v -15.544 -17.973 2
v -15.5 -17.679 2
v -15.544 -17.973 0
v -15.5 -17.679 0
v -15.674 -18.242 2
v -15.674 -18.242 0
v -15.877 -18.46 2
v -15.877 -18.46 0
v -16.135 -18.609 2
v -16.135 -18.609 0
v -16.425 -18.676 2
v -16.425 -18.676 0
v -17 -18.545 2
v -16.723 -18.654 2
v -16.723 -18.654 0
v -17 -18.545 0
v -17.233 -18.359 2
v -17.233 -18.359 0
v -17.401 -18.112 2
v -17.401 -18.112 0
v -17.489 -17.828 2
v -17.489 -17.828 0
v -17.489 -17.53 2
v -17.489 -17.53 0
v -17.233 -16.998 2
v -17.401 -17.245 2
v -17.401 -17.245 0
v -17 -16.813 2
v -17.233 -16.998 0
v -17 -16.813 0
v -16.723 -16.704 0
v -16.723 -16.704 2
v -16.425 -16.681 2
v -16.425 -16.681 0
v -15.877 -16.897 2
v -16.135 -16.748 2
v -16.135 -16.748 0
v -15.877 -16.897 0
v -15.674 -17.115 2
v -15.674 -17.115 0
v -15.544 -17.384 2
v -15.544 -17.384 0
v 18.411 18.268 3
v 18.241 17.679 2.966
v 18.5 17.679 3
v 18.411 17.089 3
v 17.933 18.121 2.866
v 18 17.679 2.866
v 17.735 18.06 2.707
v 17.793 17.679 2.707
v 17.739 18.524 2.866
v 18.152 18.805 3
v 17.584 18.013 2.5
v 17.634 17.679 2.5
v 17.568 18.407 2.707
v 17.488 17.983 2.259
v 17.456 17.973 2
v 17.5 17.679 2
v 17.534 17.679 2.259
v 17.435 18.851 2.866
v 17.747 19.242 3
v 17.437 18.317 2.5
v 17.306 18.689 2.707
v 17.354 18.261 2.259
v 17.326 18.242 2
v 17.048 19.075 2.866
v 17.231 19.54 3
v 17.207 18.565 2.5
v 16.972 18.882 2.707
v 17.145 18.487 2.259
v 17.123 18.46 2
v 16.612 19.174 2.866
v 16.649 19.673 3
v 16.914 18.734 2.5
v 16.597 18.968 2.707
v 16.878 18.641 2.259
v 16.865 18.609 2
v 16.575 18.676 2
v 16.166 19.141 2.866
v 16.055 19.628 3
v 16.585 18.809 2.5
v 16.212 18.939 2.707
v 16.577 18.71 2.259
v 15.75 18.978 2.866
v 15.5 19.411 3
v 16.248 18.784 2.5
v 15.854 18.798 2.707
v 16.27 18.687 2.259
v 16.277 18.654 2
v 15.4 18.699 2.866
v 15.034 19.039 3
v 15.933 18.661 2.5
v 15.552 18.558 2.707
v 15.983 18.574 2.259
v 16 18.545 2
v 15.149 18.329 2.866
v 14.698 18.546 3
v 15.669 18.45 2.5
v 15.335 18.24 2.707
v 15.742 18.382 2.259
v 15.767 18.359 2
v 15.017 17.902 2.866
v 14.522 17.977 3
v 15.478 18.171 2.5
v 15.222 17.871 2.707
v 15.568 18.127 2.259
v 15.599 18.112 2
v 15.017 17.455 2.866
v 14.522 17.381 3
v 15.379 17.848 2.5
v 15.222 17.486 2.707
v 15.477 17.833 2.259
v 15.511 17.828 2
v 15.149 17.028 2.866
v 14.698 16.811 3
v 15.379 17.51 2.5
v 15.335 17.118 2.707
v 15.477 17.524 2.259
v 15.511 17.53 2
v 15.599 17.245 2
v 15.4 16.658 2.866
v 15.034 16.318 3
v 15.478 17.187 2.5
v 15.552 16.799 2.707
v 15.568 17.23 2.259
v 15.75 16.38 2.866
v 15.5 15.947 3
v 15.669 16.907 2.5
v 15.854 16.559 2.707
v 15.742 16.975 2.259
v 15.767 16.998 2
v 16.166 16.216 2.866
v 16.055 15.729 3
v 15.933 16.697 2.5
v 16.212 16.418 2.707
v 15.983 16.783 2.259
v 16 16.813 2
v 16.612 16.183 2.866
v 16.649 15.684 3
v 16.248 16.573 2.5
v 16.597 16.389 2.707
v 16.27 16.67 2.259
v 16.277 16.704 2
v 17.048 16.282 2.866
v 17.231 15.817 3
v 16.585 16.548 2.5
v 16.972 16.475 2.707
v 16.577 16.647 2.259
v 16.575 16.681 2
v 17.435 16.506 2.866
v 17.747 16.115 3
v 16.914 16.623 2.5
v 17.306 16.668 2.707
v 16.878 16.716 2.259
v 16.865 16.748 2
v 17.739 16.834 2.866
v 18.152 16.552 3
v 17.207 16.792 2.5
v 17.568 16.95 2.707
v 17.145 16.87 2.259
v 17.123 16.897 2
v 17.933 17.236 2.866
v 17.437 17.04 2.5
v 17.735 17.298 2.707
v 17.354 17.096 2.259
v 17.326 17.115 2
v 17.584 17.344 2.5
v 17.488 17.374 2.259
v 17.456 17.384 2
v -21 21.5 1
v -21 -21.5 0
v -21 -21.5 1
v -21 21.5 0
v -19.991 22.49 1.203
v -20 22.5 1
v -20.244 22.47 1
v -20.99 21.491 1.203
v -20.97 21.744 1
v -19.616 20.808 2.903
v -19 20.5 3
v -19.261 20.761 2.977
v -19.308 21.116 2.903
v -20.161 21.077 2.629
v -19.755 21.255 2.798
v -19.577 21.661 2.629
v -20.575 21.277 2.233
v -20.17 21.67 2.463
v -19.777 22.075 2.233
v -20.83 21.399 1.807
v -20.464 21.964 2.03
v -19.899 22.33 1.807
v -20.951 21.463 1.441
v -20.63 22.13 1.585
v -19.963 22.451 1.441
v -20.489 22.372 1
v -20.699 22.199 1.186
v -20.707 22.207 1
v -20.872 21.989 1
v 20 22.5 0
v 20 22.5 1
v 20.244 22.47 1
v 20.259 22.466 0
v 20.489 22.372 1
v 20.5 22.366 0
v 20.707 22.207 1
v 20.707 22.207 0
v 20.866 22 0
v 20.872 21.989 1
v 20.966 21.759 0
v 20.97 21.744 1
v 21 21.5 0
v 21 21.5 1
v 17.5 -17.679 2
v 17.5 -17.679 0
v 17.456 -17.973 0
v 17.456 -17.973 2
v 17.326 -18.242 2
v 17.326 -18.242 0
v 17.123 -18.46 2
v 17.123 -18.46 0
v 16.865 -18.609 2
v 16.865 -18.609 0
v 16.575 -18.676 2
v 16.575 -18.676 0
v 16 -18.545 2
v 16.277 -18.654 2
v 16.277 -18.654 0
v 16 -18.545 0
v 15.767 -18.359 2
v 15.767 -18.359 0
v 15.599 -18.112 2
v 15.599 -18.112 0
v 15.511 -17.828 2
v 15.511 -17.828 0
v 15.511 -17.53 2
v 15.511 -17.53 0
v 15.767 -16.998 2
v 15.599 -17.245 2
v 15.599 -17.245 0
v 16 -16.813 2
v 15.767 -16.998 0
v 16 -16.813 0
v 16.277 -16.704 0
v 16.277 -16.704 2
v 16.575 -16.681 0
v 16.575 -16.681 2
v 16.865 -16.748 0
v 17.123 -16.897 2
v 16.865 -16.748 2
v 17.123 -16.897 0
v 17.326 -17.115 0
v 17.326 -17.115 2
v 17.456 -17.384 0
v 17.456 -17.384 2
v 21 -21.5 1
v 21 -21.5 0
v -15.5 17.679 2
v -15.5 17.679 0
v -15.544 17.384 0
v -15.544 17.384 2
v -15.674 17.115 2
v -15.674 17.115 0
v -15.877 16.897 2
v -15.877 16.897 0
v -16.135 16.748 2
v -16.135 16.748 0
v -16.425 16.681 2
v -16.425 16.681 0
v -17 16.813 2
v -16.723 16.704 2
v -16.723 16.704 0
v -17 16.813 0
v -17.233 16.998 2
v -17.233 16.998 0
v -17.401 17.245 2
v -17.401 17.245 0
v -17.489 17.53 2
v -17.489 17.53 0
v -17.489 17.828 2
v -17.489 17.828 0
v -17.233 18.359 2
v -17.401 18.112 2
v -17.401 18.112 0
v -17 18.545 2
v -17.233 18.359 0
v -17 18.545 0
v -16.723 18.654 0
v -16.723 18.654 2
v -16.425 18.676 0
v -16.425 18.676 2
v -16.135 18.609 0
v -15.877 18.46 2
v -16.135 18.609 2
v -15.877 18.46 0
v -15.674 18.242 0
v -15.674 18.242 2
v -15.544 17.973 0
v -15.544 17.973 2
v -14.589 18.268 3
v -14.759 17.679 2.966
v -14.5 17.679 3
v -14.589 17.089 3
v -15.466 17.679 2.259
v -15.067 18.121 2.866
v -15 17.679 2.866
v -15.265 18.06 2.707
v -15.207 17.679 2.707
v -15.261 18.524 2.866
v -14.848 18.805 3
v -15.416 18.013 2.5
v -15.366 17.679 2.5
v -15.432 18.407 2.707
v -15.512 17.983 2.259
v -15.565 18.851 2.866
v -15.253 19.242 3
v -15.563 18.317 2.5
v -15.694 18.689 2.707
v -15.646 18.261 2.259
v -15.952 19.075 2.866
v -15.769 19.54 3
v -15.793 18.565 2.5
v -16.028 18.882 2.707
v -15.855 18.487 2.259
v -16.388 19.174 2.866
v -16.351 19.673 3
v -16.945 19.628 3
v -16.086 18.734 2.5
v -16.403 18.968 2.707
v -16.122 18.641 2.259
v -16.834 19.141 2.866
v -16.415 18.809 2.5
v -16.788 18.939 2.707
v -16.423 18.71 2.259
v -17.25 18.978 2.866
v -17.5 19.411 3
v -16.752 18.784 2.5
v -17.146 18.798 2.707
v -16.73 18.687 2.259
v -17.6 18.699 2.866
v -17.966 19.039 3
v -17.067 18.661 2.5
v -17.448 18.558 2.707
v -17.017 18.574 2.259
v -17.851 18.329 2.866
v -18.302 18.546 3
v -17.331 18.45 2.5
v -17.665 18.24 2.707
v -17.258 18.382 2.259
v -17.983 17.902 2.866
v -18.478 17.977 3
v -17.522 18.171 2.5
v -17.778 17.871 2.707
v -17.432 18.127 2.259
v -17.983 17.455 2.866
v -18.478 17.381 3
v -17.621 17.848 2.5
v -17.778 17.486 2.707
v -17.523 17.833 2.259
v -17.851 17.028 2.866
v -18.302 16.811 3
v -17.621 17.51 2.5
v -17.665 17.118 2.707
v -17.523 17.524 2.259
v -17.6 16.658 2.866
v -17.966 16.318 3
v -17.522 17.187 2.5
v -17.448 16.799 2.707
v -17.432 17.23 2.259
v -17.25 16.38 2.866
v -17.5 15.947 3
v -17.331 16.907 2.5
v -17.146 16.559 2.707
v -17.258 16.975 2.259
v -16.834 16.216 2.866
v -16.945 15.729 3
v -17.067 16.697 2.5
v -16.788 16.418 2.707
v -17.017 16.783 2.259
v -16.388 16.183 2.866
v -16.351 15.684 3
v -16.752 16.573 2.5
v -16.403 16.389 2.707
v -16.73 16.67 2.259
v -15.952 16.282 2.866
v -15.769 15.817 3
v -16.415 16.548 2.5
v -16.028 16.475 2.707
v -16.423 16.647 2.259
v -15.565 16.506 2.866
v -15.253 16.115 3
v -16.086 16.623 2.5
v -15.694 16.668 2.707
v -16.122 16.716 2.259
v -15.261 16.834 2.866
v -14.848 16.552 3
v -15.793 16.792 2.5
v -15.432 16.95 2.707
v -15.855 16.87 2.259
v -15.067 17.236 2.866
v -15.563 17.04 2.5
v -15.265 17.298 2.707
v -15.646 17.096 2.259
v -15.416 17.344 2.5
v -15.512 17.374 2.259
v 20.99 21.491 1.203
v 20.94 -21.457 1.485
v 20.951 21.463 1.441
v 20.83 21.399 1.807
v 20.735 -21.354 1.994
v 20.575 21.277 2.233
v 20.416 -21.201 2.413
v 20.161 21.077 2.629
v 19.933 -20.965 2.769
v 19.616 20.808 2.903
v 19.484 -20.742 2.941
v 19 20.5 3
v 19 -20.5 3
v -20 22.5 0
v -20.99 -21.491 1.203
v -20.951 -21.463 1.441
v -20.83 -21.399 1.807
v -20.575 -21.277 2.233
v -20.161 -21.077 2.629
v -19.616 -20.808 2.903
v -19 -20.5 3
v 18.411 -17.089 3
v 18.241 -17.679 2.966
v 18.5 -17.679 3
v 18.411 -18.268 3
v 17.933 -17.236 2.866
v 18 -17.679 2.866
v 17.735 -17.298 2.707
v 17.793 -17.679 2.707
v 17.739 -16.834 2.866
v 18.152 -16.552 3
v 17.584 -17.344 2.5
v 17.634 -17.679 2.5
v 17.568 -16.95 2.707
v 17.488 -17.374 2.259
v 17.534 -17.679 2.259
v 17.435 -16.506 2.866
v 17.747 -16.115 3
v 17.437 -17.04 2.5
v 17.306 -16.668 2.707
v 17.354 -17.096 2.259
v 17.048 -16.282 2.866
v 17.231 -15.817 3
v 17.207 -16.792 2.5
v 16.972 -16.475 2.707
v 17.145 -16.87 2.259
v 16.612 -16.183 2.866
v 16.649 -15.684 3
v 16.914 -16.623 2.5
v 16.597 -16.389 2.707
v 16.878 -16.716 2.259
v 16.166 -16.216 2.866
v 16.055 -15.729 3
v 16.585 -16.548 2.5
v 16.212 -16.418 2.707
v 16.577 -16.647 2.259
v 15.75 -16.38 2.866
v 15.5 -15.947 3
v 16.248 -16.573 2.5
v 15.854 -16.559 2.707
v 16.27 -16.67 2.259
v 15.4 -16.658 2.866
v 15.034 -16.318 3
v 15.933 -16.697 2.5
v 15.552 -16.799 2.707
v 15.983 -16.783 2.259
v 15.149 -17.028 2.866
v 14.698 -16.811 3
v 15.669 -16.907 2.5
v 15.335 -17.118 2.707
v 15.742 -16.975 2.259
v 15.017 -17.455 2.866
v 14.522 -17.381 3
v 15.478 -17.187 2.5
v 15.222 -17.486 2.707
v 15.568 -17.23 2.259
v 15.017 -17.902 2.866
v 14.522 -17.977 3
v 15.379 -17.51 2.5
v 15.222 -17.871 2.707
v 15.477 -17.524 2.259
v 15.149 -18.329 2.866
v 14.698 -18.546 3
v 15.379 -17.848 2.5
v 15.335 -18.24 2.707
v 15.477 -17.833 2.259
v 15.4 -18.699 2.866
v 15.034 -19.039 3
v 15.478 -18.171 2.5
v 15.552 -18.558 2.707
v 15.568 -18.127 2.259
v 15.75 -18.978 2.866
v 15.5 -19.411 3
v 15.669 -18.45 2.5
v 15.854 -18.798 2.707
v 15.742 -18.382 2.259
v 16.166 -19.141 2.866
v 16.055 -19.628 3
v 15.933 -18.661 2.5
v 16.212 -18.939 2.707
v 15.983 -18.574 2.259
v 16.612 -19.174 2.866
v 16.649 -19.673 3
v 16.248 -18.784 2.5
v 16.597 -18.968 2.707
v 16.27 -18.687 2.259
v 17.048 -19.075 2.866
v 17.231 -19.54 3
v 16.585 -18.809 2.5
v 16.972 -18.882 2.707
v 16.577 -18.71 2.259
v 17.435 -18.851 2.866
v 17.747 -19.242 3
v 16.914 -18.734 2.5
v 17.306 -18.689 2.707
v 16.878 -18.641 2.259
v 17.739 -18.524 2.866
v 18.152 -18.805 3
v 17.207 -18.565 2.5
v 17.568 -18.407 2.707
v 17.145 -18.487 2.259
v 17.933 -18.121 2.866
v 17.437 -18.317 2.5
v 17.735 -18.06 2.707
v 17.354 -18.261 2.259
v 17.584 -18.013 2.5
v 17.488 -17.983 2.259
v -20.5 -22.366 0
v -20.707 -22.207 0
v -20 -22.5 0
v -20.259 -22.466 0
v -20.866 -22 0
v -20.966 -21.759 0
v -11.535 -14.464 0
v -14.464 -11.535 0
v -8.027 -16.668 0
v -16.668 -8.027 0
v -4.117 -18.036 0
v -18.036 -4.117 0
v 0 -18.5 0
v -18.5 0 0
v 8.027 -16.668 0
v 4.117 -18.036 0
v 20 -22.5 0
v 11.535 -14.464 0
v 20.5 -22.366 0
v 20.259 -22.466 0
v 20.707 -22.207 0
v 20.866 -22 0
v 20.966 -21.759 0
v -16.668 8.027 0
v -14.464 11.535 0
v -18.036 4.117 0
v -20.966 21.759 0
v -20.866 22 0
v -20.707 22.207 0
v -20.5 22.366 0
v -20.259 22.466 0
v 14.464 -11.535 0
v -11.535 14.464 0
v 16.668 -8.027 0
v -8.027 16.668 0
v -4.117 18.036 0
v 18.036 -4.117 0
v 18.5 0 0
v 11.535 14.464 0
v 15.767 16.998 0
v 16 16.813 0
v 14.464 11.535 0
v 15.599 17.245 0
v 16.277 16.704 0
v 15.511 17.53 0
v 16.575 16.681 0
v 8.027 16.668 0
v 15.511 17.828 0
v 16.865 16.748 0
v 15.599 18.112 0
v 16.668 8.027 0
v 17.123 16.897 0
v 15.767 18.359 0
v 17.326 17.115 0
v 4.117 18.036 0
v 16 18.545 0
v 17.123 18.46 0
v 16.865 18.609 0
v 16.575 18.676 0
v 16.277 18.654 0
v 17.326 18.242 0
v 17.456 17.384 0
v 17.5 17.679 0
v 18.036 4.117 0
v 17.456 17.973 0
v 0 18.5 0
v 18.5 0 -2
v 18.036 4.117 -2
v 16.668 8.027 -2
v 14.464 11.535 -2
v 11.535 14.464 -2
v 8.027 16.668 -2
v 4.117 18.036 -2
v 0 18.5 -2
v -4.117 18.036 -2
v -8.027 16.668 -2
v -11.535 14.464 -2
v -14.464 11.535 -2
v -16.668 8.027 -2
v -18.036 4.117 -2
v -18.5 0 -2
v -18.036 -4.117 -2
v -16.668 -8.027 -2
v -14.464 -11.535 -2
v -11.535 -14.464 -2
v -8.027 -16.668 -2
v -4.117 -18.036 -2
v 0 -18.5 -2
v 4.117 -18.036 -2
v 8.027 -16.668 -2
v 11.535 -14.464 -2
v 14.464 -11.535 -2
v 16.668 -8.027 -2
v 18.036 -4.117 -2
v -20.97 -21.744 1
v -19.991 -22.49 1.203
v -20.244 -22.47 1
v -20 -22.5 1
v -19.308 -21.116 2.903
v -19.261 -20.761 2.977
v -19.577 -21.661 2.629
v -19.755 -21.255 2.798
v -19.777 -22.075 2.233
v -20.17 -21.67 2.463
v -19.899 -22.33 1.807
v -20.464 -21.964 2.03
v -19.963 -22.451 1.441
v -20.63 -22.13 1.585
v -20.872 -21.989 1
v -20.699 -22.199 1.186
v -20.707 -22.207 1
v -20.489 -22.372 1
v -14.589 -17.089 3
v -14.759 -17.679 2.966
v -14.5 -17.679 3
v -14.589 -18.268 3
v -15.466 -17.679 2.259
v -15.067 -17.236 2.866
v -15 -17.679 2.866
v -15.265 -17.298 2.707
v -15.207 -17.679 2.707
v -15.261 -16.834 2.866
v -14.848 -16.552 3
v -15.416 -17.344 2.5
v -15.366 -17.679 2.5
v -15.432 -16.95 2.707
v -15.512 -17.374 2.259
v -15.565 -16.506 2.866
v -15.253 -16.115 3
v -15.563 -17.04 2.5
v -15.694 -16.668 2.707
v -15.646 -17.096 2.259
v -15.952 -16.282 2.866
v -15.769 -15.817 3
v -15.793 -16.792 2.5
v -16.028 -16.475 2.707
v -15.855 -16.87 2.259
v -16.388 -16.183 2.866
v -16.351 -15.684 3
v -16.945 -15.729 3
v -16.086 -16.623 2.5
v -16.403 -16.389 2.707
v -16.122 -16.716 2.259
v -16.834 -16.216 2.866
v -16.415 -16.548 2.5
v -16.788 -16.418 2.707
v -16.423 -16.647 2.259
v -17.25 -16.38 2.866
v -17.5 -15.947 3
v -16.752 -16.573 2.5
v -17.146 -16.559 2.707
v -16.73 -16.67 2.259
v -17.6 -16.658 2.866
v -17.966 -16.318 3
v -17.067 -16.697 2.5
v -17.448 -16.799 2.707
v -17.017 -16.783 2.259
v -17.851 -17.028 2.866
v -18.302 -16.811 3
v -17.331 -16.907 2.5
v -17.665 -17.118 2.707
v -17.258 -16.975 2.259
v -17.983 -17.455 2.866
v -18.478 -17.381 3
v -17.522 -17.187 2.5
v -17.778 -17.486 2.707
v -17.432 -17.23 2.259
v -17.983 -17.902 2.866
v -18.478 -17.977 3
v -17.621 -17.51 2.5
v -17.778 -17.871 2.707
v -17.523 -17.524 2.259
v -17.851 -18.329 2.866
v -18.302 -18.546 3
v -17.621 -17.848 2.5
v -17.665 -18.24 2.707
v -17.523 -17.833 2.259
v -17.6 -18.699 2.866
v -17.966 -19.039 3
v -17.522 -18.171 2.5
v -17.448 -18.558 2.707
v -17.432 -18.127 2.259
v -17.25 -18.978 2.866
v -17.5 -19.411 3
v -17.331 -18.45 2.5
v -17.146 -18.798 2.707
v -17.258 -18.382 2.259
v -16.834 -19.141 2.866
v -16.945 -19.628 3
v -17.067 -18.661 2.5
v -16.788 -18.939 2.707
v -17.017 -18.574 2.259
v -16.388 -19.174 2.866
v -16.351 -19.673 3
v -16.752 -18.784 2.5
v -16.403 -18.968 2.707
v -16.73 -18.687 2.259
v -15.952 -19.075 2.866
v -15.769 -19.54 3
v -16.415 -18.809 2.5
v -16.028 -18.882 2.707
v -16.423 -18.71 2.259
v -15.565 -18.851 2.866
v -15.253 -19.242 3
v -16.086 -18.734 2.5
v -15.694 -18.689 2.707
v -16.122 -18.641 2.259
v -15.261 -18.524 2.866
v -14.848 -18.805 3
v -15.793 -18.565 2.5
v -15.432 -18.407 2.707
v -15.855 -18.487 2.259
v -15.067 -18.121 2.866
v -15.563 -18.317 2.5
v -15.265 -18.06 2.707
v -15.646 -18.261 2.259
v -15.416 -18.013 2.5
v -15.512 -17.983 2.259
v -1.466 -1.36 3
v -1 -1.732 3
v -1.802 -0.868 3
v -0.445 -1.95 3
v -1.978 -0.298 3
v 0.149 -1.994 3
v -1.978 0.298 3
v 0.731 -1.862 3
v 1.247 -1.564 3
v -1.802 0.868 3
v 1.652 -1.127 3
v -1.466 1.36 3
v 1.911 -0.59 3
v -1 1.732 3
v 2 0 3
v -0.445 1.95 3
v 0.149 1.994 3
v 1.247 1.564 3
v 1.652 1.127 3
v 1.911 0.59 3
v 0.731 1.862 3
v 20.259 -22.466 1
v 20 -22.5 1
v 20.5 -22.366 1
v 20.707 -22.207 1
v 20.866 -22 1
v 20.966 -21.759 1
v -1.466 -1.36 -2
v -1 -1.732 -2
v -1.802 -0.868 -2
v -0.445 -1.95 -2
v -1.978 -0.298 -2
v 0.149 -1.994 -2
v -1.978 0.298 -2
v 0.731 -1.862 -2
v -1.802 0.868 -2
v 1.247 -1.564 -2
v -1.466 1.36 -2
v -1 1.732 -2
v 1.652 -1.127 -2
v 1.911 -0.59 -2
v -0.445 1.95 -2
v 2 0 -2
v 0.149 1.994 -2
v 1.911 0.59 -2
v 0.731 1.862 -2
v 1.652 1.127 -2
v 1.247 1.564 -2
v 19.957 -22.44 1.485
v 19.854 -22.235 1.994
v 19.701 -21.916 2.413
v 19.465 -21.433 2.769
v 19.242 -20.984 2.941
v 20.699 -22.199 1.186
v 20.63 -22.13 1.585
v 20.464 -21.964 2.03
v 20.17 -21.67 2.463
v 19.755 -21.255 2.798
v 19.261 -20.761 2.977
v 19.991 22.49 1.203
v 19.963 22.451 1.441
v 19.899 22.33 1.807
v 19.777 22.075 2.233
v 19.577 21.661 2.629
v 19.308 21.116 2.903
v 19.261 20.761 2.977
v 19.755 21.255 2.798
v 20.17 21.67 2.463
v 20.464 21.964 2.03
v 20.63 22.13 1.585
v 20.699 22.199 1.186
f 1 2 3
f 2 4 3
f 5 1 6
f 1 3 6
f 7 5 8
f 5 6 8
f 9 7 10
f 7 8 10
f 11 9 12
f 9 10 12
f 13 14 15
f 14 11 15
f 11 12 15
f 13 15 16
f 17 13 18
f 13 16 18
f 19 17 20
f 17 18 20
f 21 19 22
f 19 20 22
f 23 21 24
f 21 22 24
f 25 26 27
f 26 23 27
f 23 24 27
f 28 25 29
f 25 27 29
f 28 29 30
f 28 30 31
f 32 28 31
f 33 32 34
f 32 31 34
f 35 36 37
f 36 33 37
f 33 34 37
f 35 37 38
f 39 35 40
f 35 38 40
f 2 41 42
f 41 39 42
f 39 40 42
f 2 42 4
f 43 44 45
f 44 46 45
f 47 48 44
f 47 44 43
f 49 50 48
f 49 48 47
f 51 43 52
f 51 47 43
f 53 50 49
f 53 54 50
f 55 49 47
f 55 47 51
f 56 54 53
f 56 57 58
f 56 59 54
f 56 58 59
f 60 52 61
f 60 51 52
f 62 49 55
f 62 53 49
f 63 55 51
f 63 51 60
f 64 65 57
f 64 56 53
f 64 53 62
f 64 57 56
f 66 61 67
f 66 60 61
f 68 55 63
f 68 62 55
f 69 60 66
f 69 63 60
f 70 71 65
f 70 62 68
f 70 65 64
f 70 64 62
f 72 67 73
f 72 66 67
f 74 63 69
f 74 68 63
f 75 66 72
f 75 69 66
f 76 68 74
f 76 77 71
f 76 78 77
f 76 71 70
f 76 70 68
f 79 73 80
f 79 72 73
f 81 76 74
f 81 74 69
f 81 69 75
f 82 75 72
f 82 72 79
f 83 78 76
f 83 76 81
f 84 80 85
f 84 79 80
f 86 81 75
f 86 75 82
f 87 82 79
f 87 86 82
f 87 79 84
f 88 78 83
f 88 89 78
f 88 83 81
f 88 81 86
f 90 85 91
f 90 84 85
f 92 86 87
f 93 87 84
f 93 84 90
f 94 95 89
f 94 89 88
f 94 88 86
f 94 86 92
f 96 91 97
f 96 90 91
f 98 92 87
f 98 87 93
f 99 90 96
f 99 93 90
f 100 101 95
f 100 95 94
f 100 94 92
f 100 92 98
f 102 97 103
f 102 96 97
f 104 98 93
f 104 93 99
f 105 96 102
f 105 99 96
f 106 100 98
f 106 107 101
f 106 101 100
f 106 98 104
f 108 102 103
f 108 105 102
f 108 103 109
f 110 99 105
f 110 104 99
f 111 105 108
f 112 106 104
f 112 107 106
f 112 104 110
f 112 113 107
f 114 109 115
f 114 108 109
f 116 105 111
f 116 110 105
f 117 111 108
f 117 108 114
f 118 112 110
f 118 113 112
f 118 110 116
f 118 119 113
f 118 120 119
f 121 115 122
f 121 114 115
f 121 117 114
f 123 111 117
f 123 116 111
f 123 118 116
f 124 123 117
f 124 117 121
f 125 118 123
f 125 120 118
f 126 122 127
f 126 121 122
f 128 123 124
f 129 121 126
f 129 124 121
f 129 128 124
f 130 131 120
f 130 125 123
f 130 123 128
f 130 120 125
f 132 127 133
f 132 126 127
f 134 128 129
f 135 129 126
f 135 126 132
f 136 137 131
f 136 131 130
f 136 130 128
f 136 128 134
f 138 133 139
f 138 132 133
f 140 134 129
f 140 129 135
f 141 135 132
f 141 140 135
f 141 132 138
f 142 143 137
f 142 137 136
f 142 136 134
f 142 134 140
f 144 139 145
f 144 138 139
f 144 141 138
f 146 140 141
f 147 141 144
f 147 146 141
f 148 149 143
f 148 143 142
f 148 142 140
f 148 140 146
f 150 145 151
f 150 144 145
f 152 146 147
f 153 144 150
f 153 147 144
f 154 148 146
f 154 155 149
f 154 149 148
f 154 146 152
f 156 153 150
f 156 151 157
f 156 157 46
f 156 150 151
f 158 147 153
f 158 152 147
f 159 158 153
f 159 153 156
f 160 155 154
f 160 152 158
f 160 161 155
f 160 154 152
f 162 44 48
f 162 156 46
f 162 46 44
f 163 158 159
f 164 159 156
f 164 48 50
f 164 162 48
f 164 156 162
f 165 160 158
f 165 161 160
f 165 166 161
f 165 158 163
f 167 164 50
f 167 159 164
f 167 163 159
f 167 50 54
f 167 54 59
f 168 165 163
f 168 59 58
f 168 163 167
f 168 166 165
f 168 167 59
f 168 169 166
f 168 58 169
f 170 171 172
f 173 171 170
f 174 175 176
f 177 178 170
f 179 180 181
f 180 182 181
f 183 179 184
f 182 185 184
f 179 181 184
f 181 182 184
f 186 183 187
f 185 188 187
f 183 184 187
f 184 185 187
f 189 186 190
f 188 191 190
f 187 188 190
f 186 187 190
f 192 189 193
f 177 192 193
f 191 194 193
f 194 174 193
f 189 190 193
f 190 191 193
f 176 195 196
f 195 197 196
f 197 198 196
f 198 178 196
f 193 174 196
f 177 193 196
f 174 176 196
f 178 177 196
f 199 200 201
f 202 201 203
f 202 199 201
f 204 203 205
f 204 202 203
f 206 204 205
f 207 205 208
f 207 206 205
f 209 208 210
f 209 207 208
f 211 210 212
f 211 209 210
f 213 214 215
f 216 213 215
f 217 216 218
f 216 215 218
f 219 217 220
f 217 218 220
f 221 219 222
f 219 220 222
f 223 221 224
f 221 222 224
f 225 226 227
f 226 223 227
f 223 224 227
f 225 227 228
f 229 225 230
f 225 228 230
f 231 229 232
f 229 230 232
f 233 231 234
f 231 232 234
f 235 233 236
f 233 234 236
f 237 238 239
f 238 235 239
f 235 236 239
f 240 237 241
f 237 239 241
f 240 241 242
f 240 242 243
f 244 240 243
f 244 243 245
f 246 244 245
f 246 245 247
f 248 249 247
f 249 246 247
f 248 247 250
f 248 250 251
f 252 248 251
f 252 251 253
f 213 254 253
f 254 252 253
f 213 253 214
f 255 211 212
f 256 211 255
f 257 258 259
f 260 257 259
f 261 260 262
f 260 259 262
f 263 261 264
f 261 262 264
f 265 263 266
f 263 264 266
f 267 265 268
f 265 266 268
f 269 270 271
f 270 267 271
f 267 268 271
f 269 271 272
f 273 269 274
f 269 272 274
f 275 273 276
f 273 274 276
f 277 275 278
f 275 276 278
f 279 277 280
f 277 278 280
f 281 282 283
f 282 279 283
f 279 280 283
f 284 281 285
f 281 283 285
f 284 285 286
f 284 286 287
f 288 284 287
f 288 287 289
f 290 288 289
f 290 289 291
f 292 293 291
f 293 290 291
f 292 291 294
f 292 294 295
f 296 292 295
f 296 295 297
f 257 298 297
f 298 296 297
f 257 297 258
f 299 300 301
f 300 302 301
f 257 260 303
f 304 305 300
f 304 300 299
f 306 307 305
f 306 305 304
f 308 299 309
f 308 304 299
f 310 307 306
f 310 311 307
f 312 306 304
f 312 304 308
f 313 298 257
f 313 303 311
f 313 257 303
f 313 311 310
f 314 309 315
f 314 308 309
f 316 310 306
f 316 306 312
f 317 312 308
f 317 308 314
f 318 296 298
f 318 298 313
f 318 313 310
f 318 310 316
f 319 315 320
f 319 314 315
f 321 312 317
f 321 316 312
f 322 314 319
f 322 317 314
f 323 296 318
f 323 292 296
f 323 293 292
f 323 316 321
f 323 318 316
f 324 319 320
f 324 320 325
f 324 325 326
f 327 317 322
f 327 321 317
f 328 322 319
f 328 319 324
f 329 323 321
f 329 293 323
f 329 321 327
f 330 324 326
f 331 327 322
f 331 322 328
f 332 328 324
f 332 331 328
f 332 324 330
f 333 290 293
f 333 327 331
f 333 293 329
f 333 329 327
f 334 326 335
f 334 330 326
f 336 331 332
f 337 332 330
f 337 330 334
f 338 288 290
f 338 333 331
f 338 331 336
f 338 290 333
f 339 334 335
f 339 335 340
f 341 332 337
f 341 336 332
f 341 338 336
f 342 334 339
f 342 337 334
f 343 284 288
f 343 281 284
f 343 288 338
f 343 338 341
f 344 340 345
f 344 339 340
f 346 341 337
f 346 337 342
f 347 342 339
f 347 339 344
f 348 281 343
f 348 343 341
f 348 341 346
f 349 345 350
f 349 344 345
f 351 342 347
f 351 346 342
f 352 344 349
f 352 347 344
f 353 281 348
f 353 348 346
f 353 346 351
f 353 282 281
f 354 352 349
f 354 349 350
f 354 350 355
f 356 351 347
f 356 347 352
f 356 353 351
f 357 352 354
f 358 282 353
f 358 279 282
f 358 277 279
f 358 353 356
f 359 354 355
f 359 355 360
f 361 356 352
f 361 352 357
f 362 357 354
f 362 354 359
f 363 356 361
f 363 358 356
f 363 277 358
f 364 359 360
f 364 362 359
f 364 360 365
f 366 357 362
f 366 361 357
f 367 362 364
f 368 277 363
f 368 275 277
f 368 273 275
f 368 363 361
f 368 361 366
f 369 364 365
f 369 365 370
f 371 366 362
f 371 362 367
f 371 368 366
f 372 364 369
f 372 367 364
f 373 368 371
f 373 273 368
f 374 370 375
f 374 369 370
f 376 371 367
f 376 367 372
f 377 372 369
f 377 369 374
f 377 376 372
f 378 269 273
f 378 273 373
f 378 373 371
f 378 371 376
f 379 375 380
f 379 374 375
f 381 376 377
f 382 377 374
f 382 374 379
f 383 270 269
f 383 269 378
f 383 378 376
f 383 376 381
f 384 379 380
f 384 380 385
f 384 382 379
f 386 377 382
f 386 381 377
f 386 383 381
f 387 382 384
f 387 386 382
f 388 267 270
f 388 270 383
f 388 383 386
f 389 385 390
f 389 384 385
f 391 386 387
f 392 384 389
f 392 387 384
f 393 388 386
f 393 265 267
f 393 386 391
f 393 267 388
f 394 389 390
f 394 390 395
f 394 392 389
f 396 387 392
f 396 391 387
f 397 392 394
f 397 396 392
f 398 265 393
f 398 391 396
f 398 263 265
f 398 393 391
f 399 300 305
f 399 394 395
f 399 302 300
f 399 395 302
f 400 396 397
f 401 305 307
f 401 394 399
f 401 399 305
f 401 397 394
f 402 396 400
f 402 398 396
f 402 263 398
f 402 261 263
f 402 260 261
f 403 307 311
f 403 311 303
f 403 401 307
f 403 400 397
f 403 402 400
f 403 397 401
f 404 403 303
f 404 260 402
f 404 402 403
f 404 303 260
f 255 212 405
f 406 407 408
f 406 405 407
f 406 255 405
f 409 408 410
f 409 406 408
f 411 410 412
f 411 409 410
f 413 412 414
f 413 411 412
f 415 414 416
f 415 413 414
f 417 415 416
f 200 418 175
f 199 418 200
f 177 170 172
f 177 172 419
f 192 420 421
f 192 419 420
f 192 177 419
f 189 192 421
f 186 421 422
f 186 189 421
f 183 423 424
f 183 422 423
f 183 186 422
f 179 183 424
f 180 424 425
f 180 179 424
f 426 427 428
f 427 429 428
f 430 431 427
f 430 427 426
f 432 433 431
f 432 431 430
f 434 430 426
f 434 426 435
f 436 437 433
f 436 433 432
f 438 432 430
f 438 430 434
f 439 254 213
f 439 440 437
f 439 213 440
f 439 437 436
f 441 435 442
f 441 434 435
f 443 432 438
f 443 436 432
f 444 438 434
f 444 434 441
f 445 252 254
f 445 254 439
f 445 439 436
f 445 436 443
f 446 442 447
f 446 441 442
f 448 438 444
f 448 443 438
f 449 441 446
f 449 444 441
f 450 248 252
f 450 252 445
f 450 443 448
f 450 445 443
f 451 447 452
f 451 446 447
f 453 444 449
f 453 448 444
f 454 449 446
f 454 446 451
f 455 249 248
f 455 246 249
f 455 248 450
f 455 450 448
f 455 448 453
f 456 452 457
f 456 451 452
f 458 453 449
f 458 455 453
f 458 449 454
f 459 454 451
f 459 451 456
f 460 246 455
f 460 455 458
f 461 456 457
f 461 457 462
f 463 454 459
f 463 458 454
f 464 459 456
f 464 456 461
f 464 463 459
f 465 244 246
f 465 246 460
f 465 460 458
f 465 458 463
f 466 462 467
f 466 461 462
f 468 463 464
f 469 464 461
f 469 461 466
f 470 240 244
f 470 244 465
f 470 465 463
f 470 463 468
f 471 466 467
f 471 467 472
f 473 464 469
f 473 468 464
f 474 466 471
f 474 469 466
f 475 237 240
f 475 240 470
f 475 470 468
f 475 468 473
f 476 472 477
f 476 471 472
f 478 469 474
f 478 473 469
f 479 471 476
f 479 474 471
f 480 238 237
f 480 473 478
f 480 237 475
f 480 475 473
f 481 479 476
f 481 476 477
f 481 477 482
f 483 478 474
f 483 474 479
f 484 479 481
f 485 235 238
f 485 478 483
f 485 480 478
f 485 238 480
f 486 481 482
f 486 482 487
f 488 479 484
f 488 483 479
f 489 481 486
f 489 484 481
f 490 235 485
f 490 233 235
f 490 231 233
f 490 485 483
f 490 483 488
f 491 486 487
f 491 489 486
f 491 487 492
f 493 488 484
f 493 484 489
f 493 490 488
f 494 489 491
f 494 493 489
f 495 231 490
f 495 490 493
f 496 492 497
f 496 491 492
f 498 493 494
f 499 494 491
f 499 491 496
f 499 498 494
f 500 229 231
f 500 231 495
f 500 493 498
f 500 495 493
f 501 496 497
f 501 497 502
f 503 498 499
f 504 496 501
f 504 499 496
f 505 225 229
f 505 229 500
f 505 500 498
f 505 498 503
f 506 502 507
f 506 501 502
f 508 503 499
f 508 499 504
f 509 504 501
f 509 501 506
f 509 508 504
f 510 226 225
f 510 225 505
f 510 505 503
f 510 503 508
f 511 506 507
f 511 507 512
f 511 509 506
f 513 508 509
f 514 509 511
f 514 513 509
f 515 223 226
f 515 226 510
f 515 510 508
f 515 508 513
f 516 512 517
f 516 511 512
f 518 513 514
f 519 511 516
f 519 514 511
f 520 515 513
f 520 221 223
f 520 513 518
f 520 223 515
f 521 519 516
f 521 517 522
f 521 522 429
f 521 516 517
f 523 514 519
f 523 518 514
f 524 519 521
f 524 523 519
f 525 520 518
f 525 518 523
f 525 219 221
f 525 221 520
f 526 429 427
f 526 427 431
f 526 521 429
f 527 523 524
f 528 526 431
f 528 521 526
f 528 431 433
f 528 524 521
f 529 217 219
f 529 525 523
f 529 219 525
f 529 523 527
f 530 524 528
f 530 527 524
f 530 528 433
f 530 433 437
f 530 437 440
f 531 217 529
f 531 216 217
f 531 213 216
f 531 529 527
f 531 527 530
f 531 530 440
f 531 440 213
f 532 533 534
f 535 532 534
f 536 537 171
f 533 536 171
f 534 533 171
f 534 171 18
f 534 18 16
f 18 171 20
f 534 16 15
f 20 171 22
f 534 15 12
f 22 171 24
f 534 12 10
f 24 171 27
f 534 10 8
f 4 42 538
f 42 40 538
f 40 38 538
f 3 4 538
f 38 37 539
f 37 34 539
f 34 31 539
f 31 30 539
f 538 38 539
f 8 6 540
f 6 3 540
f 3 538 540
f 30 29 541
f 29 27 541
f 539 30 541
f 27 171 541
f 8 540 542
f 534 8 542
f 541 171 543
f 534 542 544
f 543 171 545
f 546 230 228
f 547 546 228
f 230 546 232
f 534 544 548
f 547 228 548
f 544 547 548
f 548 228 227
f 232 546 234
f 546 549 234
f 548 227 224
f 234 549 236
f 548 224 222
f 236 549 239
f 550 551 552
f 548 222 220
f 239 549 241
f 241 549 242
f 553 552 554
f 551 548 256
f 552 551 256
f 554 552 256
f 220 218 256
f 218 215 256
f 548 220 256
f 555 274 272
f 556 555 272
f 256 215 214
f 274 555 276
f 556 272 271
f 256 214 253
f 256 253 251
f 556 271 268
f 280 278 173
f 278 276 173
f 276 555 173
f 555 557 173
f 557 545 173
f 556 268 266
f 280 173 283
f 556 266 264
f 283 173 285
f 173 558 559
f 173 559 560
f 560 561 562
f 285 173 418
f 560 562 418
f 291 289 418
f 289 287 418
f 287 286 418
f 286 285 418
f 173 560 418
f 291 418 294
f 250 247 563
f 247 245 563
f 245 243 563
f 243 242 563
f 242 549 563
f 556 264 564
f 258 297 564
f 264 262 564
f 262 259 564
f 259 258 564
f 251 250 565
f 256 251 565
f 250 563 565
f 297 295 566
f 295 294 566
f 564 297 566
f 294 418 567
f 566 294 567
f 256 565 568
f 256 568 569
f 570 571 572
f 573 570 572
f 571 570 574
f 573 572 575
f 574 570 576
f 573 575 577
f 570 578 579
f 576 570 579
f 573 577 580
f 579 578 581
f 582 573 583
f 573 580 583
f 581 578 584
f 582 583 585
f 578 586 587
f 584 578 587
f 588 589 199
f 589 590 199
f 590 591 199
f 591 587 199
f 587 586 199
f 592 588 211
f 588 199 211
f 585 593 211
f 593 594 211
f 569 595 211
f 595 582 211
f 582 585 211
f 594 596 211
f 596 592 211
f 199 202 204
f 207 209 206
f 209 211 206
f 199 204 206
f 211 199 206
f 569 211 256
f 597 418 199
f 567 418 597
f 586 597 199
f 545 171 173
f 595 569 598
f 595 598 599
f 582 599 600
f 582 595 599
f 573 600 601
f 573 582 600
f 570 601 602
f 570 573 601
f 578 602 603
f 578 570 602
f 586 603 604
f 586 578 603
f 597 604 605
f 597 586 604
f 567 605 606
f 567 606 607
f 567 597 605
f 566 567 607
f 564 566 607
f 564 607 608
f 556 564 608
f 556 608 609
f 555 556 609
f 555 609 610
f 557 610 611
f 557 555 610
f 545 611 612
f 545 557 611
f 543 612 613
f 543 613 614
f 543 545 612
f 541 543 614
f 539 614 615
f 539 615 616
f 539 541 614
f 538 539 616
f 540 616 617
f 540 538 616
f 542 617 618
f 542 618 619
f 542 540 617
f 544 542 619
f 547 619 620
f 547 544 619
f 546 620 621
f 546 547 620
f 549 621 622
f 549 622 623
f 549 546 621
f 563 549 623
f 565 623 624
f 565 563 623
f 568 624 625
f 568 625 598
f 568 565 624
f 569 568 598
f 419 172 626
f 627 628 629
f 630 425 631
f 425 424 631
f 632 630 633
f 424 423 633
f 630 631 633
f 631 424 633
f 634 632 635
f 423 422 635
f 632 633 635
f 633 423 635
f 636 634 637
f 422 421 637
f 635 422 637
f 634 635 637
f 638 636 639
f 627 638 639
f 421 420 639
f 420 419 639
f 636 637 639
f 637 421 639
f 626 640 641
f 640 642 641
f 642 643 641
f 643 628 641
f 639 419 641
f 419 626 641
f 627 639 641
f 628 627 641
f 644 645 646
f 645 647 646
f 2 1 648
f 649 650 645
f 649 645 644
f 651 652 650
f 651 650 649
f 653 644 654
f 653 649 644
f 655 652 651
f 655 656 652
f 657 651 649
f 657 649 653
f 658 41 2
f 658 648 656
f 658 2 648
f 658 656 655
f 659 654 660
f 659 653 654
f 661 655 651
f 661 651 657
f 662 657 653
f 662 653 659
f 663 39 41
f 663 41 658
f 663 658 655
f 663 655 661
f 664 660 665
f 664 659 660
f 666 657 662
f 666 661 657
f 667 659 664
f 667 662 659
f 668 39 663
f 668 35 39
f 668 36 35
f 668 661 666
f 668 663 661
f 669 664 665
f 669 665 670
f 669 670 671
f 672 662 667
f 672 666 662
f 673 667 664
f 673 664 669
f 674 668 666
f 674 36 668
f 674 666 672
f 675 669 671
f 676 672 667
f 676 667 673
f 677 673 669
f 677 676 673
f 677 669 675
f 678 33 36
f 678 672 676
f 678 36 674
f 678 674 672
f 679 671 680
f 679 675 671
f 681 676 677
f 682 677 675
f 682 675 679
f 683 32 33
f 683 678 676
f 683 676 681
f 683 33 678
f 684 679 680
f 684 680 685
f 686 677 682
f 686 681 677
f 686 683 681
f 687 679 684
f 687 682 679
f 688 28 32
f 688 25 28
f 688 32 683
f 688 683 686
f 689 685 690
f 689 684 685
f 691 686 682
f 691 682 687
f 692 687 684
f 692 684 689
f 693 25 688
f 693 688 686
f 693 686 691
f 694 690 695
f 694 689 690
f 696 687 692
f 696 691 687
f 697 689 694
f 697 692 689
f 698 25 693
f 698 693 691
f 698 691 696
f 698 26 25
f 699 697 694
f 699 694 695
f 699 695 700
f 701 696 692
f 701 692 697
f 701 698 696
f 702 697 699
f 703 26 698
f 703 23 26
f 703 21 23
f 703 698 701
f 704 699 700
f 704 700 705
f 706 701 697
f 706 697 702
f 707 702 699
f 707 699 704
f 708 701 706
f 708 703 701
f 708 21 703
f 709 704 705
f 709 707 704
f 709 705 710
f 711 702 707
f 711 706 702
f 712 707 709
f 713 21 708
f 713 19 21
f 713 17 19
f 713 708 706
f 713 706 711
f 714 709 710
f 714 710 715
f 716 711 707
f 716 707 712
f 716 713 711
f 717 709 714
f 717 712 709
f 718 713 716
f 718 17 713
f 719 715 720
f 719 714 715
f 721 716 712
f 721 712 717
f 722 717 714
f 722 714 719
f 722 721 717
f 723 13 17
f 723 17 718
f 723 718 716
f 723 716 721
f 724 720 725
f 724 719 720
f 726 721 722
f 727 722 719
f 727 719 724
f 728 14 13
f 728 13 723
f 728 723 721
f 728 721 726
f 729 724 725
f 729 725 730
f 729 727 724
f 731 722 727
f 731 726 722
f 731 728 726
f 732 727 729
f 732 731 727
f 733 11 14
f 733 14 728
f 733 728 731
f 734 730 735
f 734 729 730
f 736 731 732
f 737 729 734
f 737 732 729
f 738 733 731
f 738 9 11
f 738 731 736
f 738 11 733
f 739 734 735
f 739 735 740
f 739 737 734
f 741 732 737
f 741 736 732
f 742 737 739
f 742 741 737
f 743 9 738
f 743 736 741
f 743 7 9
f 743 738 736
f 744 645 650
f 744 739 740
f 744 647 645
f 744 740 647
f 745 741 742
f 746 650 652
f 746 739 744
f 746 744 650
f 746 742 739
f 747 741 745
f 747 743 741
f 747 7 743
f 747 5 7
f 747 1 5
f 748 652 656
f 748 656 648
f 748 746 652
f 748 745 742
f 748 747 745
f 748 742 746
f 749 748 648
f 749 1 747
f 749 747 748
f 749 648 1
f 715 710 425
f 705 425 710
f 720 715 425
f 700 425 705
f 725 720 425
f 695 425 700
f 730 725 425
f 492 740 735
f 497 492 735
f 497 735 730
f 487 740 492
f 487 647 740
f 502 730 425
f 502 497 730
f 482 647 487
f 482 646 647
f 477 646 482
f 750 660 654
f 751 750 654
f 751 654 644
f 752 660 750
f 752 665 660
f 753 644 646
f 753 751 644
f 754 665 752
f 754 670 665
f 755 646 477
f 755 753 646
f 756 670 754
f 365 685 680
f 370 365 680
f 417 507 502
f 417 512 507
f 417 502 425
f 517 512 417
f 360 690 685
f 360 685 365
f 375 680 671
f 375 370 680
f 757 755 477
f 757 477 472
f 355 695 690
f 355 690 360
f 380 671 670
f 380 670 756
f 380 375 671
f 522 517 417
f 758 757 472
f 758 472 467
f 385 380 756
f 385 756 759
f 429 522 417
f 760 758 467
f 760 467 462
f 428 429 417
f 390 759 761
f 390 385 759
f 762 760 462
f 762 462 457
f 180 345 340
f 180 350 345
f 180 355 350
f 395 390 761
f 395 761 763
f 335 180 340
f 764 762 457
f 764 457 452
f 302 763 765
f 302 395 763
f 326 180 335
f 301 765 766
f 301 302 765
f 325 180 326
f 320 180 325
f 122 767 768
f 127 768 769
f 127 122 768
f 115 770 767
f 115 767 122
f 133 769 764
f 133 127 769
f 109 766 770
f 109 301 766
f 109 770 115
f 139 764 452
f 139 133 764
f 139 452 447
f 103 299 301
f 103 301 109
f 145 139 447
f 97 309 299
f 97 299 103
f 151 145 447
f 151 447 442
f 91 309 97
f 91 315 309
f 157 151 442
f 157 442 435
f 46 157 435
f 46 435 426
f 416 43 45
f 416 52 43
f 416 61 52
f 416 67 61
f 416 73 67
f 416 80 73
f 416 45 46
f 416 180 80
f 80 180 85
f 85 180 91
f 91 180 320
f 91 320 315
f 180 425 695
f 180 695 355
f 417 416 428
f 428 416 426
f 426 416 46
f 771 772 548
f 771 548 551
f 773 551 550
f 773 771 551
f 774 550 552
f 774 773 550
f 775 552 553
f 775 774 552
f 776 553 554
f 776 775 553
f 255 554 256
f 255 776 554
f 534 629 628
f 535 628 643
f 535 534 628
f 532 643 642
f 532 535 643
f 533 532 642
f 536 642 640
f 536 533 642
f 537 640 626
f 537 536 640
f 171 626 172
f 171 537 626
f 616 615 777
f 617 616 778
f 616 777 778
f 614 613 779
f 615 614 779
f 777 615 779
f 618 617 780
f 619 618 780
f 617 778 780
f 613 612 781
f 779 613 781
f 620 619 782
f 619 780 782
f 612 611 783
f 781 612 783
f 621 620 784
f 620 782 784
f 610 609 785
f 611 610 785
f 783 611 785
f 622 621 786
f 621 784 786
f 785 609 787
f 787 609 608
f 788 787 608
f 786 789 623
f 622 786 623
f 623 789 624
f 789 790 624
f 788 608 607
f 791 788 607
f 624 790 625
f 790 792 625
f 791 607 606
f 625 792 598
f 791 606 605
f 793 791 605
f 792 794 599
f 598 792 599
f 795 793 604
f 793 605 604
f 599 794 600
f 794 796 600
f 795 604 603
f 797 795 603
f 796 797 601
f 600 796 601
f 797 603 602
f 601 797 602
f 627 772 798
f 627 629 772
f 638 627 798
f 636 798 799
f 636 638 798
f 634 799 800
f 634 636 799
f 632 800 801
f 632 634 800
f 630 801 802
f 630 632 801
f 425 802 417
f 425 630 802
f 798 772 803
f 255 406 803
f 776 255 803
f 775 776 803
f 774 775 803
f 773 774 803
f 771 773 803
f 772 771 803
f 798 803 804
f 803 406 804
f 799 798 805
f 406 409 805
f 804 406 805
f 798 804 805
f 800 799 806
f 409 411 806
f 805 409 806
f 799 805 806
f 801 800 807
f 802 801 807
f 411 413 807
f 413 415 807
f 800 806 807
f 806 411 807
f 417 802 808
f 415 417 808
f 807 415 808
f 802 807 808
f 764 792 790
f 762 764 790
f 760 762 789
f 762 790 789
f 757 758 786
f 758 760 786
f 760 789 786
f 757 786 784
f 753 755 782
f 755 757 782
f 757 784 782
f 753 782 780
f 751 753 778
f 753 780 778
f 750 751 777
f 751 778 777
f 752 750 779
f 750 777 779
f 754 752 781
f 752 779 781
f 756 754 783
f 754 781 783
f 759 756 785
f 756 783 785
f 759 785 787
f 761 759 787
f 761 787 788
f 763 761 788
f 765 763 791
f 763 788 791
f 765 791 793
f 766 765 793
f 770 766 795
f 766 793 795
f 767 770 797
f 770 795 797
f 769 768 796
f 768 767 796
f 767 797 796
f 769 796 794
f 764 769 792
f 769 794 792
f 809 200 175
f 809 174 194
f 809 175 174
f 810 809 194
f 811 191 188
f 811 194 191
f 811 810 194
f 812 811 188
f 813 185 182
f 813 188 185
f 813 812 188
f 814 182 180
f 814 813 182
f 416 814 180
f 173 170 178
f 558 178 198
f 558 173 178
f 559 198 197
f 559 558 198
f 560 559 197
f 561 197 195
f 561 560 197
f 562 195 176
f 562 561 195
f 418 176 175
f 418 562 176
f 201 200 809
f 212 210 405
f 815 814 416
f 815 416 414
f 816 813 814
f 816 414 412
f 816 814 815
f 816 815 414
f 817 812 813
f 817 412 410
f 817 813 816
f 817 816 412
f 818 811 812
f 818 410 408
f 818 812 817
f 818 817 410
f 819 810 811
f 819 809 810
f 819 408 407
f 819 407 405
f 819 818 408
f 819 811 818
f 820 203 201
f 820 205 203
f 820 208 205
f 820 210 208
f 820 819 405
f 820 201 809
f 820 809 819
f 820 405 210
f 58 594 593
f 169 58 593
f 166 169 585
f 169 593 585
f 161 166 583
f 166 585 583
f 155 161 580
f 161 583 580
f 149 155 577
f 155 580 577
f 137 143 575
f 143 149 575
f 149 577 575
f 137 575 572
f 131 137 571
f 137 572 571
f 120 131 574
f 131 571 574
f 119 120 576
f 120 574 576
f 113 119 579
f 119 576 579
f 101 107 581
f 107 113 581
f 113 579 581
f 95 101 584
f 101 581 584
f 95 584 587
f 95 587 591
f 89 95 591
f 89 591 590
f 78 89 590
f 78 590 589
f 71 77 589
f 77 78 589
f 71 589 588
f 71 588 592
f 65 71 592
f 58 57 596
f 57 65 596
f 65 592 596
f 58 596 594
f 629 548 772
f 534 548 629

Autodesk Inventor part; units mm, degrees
ref_plane "YZ Plane" through (0, 0, 0) normal (1, 0, 0) x (0, 1, 0)
ref_plane "XZ Plane" through (0, 0, 0) normal (0, 1, 0) x (-1, 0, 0)
ref_plane "XY Plane" through (0, 0, 0) normal (0, 0, 1) x (1, 0, 0)
sketch "Sketch1" plane through (0, 0, 0) normal (0, 0, 1) x (1, 0, 0)
  circle A0 centre (0, 0) radius 18.5
  line L0 (-21, 22.5) -> (21, 22.5)
  line L1 (21, 22.5) -> (21, -22.5)
  line L2 (21, -22.5) -> (-21, -22.5)
  line L3 (-21, -22.5) -> (-21, 22.5)
  line L4 (-38, 0) -> (59, 0) construction
  line L5 (0, 34) -> (0, -33) construction
  line L6 (-21, -22.5) -> (21, 22.5) construction
  line L7 (21, -22.5) -> (-21, 22.5) construction
  circle A1 centre (16.5, 17.6786) radius 1
  circle A2 centre (-16.5, 17.6786) radius 1
  circle A3 centre (16.5, -17.6786) radius 1
  circle A4 centre (-16.5, -17.6786) radius 1
  circle A5 centre (0, 0) radius 2
  dimension "d1" = 37
  dimension "d2" = 42
  dimension "d3" = 45
  dimension "d4" = 21
  dimension "d5" = 22.5
  dimension "d6" = 2
  dimension "d7" = 4.5
  dimension "d8" = 4
extrude "Extrusion1" add sketch "Sketch1" along normal blind 3 contours L0 L1 L2 L3
extrude "Extrusion2" add sketch "Sketch1" along normal blind 3 and the other way blind 2 contours A0
fillet "Fillet1" radius 1 4 edges at (15.5, 17.6786, 3) (-17.5, 17.6786, 3) (-17.5, -17.6786, 3) (15.5, -17.6786, 3)
fillet "Fillet2" radius 2 4 edges at (0, 22.5, 3) (21, 0, 3) (0, -22.5, 3) (-21, 0, 3)
fillet "Fillet3" radius 1 8 edges at (-20.4142, 21.9142, 2.4142) (-21, 22.5, 0.5) (20.4142, 21.9142, 2.4142) (21, 22.5, 0.5) (21, -22.5, 0.5) (20.4142, -21.9142, 2.4142) (-20.4142, -21.9142, 2.4142) (-21, -22.5, 0.5)
equation "\"d4\" = 0.5 * d2"
equation "\"d5\" = 0.5 * d3"
properties part number "engine_lid"
